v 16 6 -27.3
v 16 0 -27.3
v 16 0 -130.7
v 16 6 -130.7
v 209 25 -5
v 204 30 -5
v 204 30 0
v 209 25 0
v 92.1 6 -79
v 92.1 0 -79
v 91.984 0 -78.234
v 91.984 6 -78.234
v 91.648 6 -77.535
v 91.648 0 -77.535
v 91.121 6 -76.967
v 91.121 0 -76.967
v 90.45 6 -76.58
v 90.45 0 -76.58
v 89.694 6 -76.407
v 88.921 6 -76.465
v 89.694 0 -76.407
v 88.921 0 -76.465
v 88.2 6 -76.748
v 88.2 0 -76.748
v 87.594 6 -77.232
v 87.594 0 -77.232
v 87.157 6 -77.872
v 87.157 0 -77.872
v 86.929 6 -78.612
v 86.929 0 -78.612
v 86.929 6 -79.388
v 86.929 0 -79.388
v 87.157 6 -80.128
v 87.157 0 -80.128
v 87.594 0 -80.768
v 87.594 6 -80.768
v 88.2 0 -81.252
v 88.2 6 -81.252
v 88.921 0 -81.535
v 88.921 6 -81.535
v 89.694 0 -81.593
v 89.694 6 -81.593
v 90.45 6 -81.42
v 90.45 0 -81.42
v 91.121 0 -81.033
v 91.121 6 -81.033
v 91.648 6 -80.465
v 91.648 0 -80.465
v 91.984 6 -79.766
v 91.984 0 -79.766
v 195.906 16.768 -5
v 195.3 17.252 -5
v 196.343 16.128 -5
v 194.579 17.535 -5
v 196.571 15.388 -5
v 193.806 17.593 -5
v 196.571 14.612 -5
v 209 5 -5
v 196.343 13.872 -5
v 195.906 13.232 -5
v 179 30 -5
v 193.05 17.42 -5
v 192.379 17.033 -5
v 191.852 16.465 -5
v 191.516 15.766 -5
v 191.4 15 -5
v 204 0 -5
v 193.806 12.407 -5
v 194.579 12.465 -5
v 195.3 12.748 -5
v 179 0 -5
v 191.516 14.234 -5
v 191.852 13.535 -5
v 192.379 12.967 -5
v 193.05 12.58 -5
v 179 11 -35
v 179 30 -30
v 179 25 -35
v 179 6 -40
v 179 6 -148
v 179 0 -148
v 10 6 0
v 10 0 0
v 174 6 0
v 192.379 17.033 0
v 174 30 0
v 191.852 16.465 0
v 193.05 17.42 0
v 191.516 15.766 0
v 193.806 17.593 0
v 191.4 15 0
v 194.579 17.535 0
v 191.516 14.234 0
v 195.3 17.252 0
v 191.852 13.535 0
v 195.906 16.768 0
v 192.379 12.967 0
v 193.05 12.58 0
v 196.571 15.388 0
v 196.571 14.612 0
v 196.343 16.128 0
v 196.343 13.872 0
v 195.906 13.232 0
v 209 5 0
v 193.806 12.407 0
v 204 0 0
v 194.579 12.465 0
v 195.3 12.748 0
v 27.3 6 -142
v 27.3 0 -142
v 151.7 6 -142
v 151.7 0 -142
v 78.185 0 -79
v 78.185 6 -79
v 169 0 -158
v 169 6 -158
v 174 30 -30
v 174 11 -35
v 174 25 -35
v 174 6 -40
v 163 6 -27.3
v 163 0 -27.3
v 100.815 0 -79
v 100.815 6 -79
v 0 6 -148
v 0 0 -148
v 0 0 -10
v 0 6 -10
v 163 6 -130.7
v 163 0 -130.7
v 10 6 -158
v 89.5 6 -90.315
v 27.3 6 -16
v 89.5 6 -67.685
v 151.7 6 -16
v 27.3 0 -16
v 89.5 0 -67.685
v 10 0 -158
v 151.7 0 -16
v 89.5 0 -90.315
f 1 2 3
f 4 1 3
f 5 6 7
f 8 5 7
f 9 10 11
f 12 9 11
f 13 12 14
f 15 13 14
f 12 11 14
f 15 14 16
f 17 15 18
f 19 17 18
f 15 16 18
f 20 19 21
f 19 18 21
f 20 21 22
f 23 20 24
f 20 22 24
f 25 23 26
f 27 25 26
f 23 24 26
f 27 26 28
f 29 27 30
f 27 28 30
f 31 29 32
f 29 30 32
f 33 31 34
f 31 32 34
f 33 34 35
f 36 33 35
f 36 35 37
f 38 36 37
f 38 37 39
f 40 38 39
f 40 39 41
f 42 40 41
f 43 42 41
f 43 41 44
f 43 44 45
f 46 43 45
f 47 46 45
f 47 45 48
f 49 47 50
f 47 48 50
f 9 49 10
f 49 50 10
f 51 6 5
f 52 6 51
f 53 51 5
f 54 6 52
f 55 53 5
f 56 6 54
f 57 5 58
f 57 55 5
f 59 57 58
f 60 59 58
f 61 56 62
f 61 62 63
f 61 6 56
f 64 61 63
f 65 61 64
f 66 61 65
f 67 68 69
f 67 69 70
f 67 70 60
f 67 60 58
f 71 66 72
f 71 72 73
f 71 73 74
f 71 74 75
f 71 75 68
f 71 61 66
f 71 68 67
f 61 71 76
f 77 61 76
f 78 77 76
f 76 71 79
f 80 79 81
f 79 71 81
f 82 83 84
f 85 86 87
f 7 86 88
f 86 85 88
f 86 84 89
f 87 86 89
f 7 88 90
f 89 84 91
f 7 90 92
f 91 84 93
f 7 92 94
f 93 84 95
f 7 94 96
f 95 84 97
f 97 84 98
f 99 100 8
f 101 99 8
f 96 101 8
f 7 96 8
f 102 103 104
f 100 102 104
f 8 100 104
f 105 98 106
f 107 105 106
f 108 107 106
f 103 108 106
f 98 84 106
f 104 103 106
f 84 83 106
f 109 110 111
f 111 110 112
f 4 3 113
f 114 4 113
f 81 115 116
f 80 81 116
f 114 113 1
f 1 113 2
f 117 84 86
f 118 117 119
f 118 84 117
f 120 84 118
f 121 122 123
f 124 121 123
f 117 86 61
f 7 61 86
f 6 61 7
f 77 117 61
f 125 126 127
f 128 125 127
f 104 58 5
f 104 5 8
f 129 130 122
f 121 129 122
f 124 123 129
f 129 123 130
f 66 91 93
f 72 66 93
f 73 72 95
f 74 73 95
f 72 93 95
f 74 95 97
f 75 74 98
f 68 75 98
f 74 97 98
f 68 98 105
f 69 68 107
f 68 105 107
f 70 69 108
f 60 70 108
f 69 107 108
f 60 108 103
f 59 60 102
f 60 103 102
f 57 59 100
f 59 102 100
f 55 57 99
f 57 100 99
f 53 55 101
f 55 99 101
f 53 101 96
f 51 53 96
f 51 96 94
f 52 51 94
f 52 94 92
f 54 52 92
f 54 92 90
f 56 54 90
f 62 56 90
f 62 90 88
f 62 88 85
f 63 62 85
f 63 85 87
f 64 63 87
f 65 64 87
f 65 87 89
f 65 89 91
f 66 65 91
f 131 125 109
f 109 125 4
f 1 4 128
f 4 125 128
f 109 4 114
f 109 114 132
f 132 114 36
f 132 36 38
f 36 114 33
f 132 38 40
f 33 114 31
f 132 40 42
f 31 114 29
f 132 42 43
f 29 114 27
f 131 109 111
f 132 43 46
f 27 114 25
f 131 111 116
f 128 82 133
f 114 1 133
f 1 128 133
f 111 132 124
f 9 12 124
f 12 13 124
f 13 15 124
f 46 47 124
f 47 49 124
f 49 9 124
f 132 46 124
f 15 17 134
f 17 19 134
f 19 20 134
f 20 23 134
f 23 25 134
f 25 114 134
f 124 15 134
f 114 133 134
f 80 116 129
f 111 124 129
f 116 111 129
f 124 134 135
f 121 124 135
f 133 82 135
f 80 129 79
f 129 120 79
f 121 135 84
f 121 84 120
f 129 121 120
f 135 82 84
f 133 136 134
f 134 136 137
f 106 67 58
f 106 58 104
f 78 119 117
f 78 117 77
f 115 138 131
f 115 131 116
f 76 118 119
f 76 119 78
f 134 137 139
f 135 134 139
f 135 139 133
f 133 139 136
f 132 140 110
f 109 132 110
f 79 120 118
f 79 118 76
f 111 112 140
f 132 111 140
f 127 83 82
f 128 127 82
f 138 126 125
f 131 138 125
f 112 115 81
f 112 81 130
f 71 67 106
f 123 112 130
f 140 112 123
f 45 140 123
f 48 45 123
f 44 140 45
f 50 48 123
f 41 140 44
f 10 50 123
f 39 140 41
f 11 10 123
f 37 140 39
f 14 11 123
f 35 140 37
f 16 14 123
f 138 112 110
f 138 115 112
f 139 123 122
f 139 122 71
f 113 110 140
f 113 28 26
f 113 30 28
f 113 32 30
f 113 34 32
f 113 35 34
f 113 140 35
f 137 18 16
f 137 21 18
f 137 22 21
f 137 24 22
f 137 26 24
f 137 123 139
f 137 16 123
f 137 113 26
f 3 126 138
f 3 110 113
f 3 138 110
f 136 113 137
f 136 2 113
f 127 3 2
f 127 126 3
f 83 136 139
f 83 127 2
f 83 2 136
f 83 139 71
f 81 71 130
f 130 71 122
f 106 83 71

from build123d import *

# Parameters (mm, degrees)
SKETCH_W        = 179
SKETCH_H        = 158
SKETCH_R        = 2.6
PAD_DEPTH       = 6
SKETCH001_W     = 5
SKETCH001_H     = 30
PAD001_DEPTH    = 30
SKETCH002_W     = 5
SKETCH002_H     = 35
PAD002_DEPTH    = 24
SKETCH003_R     = 2.6
POCKET_DEPTH    = 7
CHAMFER_SIZE    = 5
CHAMFER001_SIZE = 5
CHAMFER002_SIZE = 5
CHAMFER003_SIZE = 10
CHAMFER004_SIZE = 10
CHAMFER005_SIZE = 10


with BuildPart() as part:
    # Sketch → Pad (new body)
    with BuildSketch(Plane.XZ):
        with Locations((89.5, -79)):
            Rectangle(SKETCH_W, SKETCH_H)
        with Locations((89.5, -79)):
            Circle(SKETCH_R, mode=Mode.SUBTRACT)
        Polygon((16, -27.3), (16, -130.7), (78.185, -79), align=None, mode=Mode.SUBTRACT)
        Polygon((27.3, -142), (151.7, -142), (89.5, -90.315), align=None, mode=Mode.SUBTRACT)
        Polygon((163, -130.7), (163, -27.3), (100.815, -79), align=None, mode=Mode.SUBTRACT)
        Polygon((151.7, -16), (27.3, -16), (89.5, -67.685), align=None, mode=Mode.SUBTRACT)
    extrude(amount=-PAD_DEPTH)

    # Sketch001 (on Face3 of Pad) → Pad001 (join)
    with BuildSketch(Plane(origin=(179, 0, 0), x_dir=(0, 0, 1), z_dir=(1, 0, 0))):
        with Locations((-2.5, -15)):
            Rectangle(SKETCH001_W, SKETCH001_H)
    extrude(amount=PAD001_DEPTH)

    # Sketch002 (on Face3 of Pad001) → Pad002 (join)
    with BuildSketch(Plane(origin=(0, 6, 0), x_dir=(1, 0, 0), z_dir=(0, 1, 0))):
        with Locations((176.5, 17.5)):
            Rectangle(SKETCH002_W, SKETCH002_H)
    extrude(amount=PAD002_DEPTH)

    # Sketch003 (on Face22 of Pad002) → Pocket (cut)
    with BuildSketch(Plane(origin=(0, 0, 0), x_dir=(-1, 0, 0), z_dir=(0, 0, 1))):
        with Locations((-194, -15)):
            Circle(SKETCH003_R)
    extrude(amount=-POCKET_DEPTH, mode=Mode.SUBTRACT)

    # Chamfer
    chamfer_edges = [part.edges().sort_by_distance(p)[0] for p in [
        (209, 30, -2.5),
        (209, 0, -2.5),
    ]]
    chamfer(chamfer_edges, length=CHAMFER_SIZE)

    # Chamfer001
    chamfer001_edges = [part.edges().sort_by_distance(p)[0] for p in [
        (176.5, 30, -35),
    ]]
    chamfer(chamfer001_edges, length=CHAMFER001_SIZE)

    # Chamfer002
    chamfer002_edges = [part.edges().sort_by_distance(p)[0] for p in [
        (176.5, 6, -35),
    ]]
    chamfer(chamfer002_edges, length=CHAMFER002_SIZE)

    # Chamfer003
    chamfer003_edges = [part.edges().sort_by_distance(p)[0] for p in [
        (179, 3, -158),
    ]]
    chamfer(chamfer003_edges, length=CHAMFER003_SIZE)

    # Chamfer004
    chamfer004_edges = [part.edges().sort_by_distance(p)[0] for p in [
        (0, 3, -158),
    ]]
    chamfer(chamfer004_edges, length=CHAMFER004_SIZE)

    # Chamfer005
    chamfer005_edges = [part.edges().sort_by_distance(p)[0] for p in [
        (0, 3, 0),
    ]]
    chamfer(chamfer005_edges, length=CHAMFER005_SIZE)


solid = part.part
